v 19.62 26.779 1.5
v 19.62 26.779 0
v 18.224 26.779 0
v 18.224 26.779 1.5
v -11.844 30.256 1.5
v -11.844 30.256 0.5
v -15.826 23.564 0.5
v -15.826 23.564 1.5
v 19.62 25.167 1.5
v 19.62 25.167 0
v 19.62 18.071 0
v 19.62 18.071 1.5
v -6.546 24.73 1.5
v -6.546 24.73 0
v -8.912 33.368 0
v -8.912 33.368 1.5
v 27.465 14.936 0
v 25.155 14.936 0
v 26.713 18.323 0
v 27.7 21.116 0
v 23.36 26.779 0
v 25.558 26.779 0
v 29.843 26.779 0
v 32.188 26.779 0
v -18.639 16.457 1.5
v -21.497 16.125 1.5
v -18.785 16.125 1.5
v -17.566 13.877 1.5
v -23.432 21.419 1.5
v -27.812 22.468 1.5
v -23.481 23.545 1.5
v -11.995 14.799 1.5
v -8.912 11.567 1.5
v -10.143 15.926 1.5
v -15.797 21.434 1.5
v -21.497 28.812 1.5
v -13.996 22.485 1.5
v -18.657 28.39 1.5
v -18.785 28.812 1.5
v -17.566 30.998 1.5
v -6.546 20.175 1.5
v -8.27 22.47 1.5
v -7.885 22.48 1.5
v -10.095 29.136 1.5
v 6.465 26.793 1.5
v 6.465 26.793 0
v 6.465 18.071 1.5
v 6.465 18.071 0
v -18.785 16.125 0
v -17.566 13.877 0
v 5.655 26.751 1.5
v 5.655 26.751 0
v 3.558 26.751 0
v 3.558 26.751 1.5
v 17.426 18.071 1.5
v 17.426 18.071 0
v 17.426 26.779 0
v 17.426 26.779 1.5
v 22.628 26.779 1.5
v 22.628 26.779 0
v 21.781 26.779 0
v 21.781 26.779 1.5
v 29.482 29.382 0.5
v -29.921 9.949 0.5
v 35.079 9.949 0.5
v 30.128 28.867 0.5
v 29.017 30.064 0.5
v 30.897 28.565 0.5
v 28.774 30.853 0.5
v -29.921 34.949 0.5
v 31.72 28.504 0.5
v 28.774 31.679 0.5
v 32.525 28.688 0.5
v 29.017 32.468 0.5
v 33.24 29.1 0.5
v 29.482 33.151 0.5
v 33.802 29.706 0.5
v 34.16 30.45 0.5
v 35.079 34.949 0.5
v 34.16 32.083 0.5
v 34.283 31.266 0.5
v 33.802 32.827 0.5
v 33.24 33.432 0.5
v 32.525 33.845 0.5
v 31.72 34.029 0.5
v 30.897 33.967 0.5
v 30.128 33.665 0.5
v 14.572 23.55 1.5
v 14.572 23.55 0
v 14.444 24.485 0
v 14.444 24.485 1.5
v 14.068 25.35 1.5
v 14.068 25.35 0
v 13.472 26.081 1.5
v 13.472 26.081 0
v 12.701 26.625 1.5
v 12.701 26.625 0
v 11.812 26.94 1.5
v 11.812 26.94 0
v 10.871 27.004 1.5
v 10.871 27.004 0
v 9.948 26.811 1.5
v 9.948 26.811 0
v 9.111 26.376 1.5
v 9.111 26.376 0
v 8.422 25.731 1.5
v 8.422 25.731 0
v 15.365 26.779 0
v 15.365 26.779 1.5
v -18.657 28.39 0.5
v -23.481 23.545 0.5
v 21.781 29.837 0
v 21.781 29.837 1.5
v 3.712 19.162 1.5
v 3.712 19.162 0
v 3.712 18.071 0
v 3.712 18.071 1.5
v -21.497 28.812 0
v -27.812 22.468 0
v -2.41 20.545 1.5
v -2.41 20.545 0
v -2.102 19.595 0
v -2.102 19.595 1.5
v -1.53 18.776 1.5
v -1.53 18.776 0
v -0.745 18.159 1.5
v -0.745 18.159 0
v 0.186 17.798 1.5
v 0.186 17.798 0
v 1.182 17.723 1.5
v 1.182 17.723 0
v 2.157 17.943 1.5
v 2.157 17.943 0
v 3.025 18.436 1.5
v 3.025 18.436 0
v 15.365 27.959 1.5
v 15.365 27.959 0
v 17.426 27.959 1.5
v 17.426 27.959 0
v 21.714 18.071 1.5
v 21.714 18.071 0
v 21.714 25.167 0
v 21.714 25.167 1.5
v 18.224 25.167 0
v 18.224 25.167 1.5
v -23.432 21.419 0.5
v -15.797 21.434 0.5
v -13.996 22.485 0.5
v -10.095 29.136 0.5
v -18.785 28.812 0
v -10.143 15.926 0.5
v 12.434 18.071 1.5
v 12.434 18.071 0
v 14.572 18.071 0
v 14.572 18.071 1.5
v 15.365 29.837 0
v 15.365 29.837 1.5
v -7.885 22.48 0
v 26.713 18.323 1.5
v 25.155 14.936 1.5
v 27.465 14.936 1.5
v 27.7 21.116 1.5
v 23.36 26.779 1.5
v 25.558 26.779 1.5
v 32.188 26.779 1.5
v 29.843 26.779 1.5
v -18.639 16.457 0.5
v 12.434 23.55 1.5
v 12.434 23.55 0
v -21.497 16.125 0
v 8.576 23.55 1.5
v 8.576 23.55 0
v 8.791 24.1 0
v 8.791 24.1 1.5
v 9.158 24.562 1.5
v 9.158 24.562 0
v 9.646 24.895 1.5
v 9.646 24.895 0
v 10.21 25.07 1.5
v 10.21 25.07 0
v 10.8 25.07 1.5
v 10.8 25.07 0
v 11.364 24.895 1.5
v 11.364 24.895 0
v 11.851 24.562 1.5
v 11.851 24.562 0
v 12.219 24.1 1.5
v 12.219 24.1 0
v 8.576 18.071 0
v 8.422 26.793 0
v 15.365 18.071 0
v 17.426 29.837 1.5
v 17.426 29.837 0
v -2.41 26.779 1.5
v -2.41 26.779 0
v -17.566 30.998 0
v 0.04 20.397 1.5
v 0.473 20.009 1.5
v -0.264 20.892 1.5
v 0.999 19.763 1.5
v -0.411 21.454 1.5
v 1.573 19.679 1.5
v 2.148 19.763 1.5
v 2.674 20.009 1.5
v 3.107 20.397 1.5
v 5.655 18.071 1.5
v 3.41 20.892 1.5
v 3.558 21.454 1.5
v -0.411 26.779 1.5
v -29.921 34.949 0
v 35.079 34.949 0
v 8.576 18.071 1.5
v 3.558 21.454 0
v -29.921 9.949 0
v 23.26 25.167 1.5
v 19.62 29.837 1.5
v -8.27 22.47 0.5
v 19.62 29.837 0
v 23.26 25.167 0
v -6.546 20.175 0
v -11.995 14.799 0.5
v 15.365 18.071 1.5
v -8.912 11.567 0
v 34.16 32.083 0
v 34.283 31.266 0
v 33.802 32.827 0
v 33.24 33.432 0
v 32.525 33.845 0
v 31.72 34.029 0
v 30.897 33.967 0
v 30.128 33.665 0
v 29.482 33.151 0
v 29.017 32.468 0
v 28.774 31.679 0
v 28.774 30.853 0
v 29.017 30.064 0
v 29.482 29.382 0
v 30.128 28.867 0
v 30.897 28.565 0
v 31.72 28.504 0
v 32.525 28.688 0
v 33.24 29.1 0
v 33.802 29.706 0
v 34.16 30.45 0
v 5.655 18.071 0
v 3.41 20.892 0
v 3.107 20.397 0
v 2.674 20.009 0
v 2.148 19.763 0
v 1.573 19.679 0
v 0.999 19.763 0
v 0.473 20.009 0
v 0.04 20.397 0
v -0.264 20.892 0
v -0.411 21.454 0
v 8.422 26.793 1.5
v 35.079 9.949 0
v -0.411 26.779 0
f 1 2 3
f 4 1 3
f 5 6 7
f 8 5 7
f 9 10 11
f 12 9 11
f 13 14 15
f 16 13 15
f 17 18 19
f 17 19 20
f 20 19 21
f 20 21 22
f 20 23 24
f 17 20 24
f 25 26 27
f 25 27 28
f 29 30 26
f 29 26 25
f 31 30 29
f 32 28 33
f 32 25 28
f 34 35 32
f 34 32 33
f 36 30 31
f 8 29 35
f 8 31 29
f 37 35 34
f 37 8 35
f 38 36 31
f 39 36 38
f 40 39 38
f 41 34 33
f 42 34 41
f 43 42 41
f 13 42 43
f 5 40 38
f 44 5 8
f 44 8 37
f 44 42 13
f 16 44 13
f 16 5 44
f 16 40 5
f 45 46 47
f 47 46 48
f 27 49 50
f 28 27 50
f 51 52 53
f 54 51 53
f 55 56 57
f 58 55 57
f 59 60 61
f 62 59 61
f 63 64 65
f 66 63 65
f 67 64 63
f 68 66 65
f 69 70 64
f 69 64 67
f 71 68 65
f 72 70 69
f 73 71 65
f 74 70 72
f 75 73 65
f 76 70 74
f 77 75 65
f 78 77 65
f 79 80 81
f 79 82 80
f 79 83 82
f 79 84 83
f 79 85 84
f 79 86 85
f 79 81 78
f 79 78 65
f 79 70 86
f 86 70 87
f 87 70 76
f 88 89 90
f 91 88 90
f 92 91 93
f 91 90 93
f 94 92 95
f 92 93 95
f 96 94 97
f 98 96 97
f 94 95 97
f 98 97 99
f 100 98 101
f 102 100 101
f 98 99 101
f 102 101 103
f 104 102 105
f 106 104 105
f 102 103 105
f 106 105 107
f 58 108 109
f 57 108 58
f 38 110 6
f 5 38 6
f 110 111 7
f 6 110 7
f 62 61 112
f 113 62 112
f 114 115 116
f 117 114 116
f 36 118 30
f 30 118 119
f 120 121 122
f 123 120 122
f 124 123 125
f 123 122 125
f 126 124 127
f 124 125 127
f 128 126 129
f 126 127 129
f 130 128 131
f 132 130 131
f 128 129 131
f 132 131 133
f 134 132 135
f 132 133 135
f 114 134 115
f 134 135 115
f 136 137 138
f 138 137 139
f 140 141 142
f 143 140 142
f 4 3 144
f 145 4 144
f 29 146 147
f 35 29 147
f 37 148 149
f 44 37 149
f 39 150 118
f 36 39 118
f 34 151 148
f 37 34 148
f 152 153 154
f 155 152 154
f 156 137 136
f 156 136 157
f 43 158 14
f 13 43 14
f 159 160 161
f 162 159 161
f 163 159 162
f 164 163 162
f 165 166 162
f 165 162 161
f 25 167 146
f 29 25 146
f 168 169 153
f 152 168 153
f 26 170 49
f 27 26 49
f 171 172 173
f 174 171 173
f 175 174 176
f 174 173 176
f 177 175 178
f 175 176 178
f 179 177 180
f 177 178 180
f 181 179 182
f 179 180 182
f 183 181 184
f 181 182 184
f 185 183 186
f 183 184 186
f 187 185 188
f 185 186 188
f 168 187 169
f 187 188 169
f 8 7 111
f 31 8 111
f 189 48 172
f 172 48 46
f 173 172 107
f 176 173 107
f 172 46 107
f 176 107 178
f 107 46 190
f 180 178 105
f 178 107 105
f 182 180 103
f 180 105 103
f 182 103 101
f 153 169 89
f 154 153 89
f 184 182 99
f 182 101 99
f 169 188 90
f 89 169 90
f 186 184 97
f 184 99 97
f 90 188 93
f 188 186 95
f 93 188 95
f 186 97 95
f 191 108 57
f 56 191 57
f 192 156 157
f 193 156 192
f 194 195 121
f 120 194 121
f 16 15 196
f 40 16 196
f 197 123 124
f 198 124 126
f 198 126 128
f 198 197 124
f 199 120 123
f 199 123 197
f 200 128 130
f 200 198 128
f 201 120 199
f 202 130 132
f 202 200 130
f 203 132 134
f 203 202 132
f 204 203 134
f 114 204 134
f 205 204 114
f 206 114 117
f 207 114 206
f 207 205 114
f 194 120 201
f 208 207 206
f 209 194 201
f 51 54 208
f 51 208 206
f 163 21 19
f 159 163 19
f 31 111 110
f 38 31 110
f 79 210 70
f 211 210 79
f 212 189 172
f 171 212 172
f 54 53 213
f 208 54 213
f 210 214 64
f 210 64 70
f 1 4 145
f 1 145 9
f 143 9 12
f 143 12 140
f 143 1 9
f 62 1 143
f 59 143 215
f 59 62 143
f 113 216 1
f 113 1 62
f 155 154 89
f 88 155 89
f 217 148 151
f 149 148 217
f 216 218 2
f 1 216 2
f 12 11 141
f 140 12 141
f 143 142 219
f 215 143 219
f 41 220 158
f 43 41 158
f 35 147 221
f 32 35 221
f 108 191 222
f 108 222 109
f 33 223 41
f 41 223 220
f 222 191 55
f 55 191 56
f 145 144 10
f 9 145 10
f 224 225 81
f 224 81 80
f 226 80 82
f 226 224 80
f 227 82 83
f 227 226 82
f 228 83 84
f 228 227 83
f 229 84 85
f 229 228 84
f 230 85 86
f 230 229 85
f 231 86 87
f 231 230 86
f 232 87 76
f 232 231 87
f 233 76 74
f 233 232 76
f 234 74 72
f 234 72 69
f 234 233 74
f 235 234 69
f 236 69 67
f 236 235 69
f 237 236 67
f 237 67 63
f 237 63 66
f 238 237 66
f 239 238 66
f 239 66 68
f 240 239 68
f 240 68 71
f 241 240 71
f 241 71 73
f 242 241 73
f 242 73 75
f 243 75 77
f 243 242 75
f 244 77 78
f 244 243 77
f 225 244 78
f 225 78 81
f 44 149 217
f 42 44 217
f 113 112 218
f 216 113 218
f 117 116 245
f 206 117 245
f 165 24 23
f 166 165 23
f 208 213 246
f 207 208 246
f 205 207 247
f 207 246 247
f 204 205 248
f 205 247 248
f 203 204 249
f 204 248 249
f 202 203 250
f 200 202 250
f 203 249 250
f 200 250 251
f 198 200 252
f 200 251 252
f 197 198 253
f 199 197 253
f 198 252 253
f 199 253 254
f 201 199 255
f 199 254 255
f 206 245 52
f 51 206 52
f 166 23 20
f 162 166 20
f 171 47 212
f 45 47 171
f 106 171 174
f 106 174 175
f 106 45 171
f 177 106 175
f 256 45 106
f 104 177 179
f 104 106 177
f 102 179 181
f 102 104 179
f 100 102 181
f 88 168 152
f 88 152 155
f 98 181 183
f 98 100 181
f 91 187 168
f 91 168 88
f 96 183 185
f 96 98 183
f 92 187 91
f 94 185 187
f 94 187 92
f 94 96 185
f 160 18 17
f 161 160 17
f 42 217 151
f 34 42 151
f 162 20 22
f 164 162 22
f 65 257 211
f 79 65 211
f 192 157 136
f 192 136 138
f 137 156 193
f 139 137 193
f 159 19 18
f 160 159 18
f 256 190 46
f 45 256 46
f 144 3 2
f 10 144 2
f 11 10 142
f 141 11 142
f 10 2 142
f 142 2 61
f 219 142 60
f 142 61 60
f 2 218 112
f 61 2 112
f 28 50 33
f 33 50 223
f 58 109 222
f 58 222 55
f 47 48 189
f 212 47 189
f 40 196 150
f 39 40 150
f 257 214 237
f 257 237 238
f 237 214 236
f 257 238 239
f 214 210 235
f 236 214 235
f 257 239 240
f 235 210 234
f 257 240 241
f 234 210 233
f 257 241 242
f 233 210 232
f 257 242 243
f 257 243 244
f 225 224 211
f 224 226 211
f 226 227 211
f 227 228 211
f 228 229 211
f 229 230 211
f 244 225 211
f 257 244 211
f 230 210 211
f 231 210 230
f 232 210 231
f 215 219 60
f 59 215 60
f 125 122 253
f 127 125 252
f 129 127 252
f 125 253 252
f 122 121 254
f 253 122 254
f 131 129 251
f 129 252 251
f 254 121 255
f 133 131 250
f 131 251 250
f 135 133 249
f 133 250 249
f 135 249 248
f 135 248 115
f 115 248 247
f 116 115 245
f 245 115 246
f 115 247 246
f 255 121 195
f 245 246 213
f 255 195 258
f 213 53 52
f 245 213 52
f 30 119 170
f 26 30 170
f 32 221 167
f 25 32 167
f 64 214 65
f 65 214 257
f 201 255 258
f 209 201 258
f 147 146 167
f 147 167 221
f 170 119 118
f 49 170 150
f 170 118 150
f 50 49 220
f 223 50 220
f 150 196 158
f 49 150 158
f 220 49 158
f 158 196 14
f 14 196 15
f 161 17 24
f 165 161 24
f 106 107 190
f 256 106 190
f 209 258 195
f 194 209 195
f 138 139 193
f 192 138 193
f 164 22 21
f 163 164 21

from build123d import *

# Parameters (mm, degrees)
F0_W     = 2.061097
F0_H     = 8.707439
F0_H_2   = 1.878258
F1_DEPTH = 1.5
F2_DEPTH = 0.5
F3_W     = 65
F3_H     = 25
F3_R     = 2.770285
F4_DEPTH = 0.5


with BuildPart() as f1:
    # F0 (on Top) → F1 (new body)
    with BuildSketch(Plane.XY):
        Polygon((-21.496991, 28.811658), (-27.812322, 22.467684), (-21.496991, 16.125386), (-18.785191, 16.125386), (-17.566214, 13.876943), (-8.911744, 11.56721), (-6.546105, 20.175021), (-7.885232, 22.479727), (-6.546105, 24.730425), (-8.911744, 33.368158), (-17.566214, 30.997935), (-18.785191, 28.811658), align=None)
        Polygon((-18.638959, 16.457254), (-23.431621, 21.419068), (-15.796979, 21.434365), (-11.995286, 14.798737), align=None, mode=Mode.SUBTRACT)
        Polygon((-15.825815, 23.56374), (-23.481131, 23.544564), (-18.657222, 28.390352), (-11.843824, 30.256355), align=None, mode=Mode.SUBTRACT)
        Polygon((-10.143321, 15.925611), (-13.996102, 22.485002), (-10.09543, 29.135993), (-8.269828, 22.470114), align=None, mode=Mode.SUBTRACT)
        with BuildLine():
            Line((-0.411379, 26.779151), (-2.410114, 26.779151))
            Line((-2.410114, 26.779151), (-2.410114, 20.545334))
            ThreePointArc((-2.410114, 20.545334), (0.186241, 17.797765), (3.711885, 19.161595))
            Line((3.711885, 19.161595), (3.711885, 18.071376))
            Line((3.711885, 18.071376), (5.654711, 18.071376))
            Line((5.654711, 18.071376), (5.654711, 26.751196))
            Line((5.654711, 26.751196), (3.558136, 26.751196))
            Line((3.558136, 26.751196), (3.558136, 21.45385))
            ThreePointArc((3.558136, 21.45385), (1.573379, 19.678749), (-0.411379, 21.45385))
            Line((-0.411379, 21.45385), (-0.411379, 26.779151))
        make_face()
        with BuildLine():
            Line((8.42219, 26.793128), (6.465387, 26.793128))
            Line((6.465387, 26.793128), (6.465387, 18.071376))
            Line((6.465387, 18.071376), (8.575939, 18.071376))
            Line((8.575939, 18.071376), (8.575939, 23.550425))
            ThreePointArc((8.575939, 23.550425), (10.504787, 25.091849), (12.433636, 23.550425))
            Line((12.433636, 23.550425), (12.433636, 18.071376))
            Line((12.433636, 18.071376), (14.572143, 18.071376))
            Line((14.572143, 18.071376), (14.572143, 23.550425))
            ThreePointArc((14.572143, 23.550425), (12.267347, 26.812948), (8.42219, 25.730863))
            Line((8.42219, 25.730863), (8.42219, 26.793128))
        make_face()
        with Locations((16.395208, 22.425095)):
            Rectangle(F0_W, F0_H)
        with Locations((16.395208, 28.898088)):
            Rectangle(F0_W, F0_H_2)
        Polygon((21.780655, 29.837217), (19.619828, 29.837217), (19.619828, 26.778815), (18.2236, 26.778815), (18.2236, 25.166508), (19.619828, 25.166508), (19.619828, 18.071376), (21.714168, 18.071376), (21.714168, 25.166508), (23.25999, 25.166508), (22.628363, 26.778815), (21.780655, 26.778815), align=None)
        Polygon((25.558328, 26.778815), (23.360141, 26.778815), (26.713498, 18.323004), (25.154579, 14.936002), (27.464919, 14.936002), (32.187678, 26.778815), (29.842546, 26.778815), (27.700437, 21.115597), align=None)
    extrude(amount=F1_DEPTH)

    # F0 (on Top) → F2 (join)
    with BuildSketch(Plane.XY):
        Polygon((-18.657222, 28.390352), (-23.481131, 23.544564), (-15.825815, 23.56374), (-11.843824, 30.256355), align=None)
        Polygon((-10.09543, 29.135993), (-13.996102, 22.485002), (-10.143321, 15.925611), (-8.269828, 22.470114), align=None)
        Polygon((-15.796979, 21.434365), (-23.431621, 21.419068), (-18.638959, 16.457254), (-11.995286, 14.798737), align=None)
    extrude(amount=F2_DEPTH)


with BuildPart() as f4:
    # F3 (on Top) → F4 (new body)
    with BuildSketch(Plane.XY):
        with Locations((2.579186, 22.449193)):
            Rectangle(F3_W, F3_H)
        with Locations((31.513099, 31.266317)):
            Circle(F3_R, mode=Mode.SUBTRACT)
    extrude(amount=F4_DEPTH)


solid = Compound([f1.part, f4.part])
